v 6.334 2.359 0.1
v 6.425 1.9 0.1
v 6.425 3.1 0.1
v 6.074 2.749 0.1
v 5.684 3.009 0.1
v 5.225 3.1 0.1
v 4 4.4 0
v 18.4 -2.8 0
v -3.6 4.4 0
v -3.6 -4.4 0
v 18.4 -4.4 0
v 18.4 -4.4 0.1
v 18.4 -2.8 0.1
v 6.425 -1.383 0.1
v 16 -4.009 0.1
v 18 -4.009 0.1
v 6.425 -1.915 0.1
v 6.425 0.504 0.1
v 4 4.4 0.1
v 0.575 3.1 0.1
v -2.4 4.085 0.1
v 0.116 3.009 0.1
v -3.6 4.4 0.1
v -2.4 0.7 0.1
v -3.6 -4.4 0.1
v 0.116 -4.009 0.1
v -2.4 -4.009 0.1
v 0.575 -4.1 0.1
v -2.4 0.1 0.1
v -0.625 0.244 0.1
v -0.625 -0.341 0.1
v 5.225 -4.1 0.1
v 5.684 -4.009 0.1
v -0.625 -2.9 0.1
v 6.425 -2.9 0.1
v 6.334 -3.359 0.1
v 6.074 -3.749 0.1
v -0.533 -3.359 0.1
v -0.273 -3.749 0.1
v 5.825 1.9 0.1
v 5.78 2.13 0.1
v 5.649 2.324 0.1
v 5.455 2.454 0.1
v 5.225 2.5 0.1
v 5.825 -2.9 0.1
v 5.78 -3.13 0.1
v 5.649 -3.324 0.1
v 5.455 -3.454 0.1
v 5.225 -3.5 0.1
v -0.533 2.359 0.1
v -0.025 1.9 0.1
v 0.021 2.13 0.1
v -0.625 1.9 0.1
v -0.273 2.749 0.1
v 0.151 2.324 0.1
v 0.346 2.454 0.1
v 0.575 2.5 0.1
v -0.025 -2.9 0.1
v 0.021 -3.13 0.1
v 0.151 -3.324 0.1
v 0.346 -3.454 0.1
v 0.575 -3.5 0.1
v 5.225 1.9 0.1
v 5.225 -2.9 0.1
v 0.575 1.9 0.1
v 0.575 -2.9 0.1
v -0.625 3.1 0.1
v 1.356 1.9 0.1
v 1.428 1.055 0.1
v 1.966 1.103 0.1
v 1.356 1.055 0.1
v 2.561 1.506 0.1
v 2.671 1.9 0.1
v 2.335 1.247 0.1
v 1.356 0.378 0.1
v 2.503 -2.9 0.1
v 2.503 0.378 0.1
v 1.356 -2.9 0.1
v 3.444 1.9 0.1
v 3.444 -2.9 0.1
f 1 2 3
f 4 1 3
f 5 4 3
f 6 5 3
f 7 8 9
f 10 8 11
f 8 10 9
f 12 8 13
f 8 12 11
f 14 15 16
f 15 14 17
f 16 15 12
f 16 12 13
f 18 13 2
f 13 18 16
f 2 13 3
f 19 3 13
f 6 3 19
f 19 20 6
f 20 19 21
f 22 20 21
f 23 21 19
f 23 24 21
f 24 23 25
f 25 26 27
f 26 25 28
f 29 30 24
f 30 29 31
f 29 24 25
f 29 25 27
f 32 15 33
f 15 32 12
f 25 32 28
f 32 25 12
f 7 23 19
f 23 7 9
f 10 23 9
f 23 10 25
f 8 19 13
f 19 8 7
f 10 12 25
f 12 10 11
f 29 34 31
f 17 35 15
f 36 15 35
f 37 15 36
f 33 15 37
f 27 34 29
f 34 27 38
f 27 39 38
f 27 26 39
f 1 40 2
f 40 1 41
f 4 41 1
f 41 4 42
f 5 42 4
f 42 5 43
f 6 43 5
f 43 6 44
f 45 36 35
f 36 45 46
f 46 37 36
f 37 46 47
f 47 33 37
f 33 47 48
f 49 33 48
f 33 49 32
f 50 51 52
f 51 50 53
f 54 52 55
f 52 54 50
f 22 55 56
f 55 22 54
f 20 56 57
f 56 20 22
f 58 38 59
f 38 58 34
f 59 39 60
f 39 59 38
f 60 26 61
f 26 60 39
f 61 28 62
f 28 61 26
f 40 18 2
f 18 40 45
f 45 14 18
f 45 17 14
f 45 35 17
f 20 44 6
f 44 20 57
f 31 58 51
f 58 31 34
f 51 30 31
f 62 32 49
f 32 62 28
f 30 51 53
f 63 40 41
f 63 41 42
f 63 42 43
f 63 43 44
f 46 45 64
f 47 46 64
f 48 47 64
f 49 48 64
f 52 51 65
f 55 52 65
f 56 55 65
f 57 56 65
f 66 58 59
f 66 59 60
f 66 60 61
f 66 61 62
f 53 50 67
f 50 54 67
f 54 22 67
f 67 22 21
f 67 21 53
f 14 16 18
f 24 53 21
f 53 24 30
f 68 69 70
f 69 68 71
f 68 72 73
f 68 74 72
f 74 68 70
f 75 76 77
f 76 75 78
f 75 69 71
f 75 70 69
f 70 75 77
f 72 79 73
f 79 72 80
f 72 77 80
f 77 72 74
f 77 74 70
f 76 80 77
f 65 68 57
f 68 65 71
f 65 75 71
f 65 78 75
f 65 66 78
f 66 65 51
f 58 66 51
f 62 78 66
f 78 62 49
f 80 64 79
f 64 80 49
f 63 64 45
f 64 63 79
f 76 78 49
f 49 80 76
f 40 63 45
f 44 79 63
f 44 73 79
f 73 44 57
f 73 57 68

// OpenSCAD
// file: ../p/1-4ndis.scad
use <../lib.scad>
function ldraw_lib__1_4ndis() = [
// 0 Disc Negative 0.25
// 0 Name: 1-4ndis.dat
// 0 Author: James Jessiman
// 0 !LDRAW_ORG Primitive UPDATE 2012-01
// 0 !LICENSE Licensed under CC BY 2.0 and CC BY 4.0 : see CAreadme.txt
// 
// 0 BFC CERTIFY CCW
  [0,"BFC","CERTIFY"],
  [0,"BFC","CCW"],
// 
// 0 !HISTORY 2002-03-23 [sbliss] Added BFC Statement
// 0 !HISTORY 2002-04-25 [PTadmin] Official Update 2002-02
// 0 !HISTORY 2007-06-22 [PTadmin] Header formatted for Contributor Agreement
// 0 !HISTORY 2008-07-01 [PTadmin] Official Update 2008-01
// 0 !HISTORY 2012-02-16 [Philo] Changed to CCW
// 0 !HISTORY 2012-03-30 [PTadmin] Official Update 2012-01
// 
// 
// 3 16 0.9239 0 0.3827 1 0 0 1 0 1
  [3,16,0.9239,0,0.3827,1,0,0,1,0,1],
// 3 16 0.7071 0 0.7071 0.9239 0 0.3827 1 0 1
  [3,16,0.7071,0,0.7071,0.9239,0,0.3827,1,0,1],
// 3 16 0.3827 0 0.9239 0.7071 0 0.7071 1 0 1
  [3,16,0.3827,0,0.9239,0.7071,0,0.7071,1,0,1],
// 3 16 0 0 1 0.3827 0 0.9239 1 0 1
  [3,16,0,0,1,0.3827,0,0.9239,1,0,1],
];
makepoly(ldraw_lib__1_4ndis(), line=0.2);
// file: ../p/3-16ndis.scad
use <../lib.scad>
function ldraw_lib__3_16ndis() = [
// 0 Disc Negative 0.1875
// 0 Name: 3-16ndis.dat
// 0 Author: Guy Vivan [guyvivan]
// 0 !LDRAW_ORG Primitive UPDATE 2009-01
// 0 !LICENSE Licensed under CC BY 2.0 and CC BY 4.0 : see CAreadme.txt
// 
// 0 BFC CERTIFY CCW
  [0,"BFC","CERTIFY"],
  [0,"BFC","CCW"],
// 
// 0 !HISTORY 2009-05-02 [PTadmin] Official Update 2009-01
// 
// 
// 3 16 1 0 1 0.9239 0 0.3827 1 0 0
  [3,16,1,0,1,0.9239,0,0.3827,1,0,0],
// 3 16 1 0 1 0.7071 0 0.7071 0.9239 0 0.3827
  [3,16,1,0,1,0.7071,0,0.7071,0.9239,0,0.3827],
// 3 16 1 0 1 0.3827 0 0.9239 0.7071 0 0.7071
  [3,16,1,0,1,0.3827,0,0.9239,0.7071,0,0.7071],
// 
// 0 end of file
// 
];
makepoly(ldraw_lib__3_16ndis(), line=0.2);
// file: ../p/1-4ring1.scad
use <../lib.scad>
function ldraw_lib__1_4ring1() = [
// 0 Ring  1 x 0.25
// 0 Name: 1-4ring1.dat
// 0 Author: Chris Dee [cwdee]
// 0 !LDRAW_ORG Primitive UPDATE 2012-01
// 0 !LICENSE Licensed under CC BY 2.0 and CC BY 4.0 : see CAreadme.txt
// 
// 0 BFC CERTIFY CCW
  [0,"BFC","CERTIFY"],
  [0,"BFC","CCW"],
// 
// 0 !HISTORY 2000-05-07 [PTadmin] Official Update 2000-01
// 0 !HISTORY 2002-11-22 [hafhead] Added BFC statement
// 0 !HISTORY 2002-11-30 [PTadmin] Official Update 2002-05
// 0 !HISTORY 2007-06-22 [PTadmin] Header formatted for Contributor Agreement
// 0 !HISTORY 2008-07-01 [PTadmin] Official Update 2008-01
// 0 !HISTORY 2012-02-16 [Philo] Changed to CCW
// 0 !HISTORY 2012-03-30 [PTadmin] Official Update 2012-01
// 
// 
// 4 16 2 0 0 1.8478 0 0.7654 0.9239 0 0.3827 1 0 0
  [4,16,2,0,0,1.8478,0,0.7654,0.9239,0,0.3827,1,0,0],
// 4 16 1.8478 0 0.7654 1.4142 0 1.4142 0.7071 0 0.7071 0.9239 0 0.3827
  [4,16,1.8478,0,0.7654,1.4142,0,1.4142,0.7071,0,0.7071,0.9239,0,0.3827],
// 4 16 1.4142 0 1.4142 0.7654 0 1.8478 0.3827 0 0.9239 0.7071 0 0.7071
  [4,16,1.4142,0,1.4142,0.7654,0,1.8478,0.3827,0,0.9239,0.7071,0,0.7071],
// 4 16 0.7654 0 1.8478 0 0 2 0 0 1 0.3827 0 0.9239
  [4,16,0.7654,0,1.8478,0,0,2,0,0,1,0.3827,0,0.9239],
];
makepoly(ldraw_lib__1_4ring1(), line=0.2);
// file: ../p/1-4disc.scad
use <../lib.scad>
function ldraw_lib__1_4disc() = [
// 0 Disc 0.25
// 0 Name: 1-4disc.dat
// 0 Author: James Jessiman
// 0 !LDRAW_ORG Primitive UPDATE 2002-02
// 0 !LICENSE Licensed under CC BY 2.0 and CC BY 4.0 : see CAreadme.txt
// 
// 0 BFC CERTIFY CCW
  [0,"BFC","CERTIFY"],
  [0,"BFC","CCW"],
// 
// 0 !HISTORY 2002-03-23 [sbliss] Added BFC statement.
// 0 !HISTORY 2002-04-25 [PTadmin] Official Update 2002-02
// 0 !HISTORY 2007-06-22 [PTadmin] Header formatted for Contributor Agreement
// 0 !HISTORY 2008-07-01 [PTadmin] Official Update 2008-01
// 
// 
// 3 16 0 0 0 1 0 0 0.9239 0 0.3827
  [3,16,0,0,0,1,0,0,0.9239,0,0.3827],
// 3 16 0 0 0 0.9239 0 0.3827 0.7071 0 0.7071
  [3,16,0,0,0,0.9239,0,0.3827,0.7071,0,0.7071],
// 3 16 0 0 0 0.7071 0 0.7071 0.3827 0 0.9239
  [3,16,0,0,0,0.7071,0,0.7071,0.3827,0,0.9239],
// 3 16 0 0 0 0.3827 0 0.9239 0 0 1
  [3,16,0,0,0,0.3827,0,0.9239,0,0,1],
// 0
];
makepoly(ldraw_lib__1_4disc(), line=0.2);
// file: ../p/type-swiss721bt-bold-n1.scad
use <../lib.scad>
function ldraw_lib__type_swiss721bt_bold_n1() = [
// 0 Type Swiss721BT Number "1" Bold
// 0 Name: type-swiss721bt-bold-n1.dat
// 0 Author: Ulrich Röder [UR]
// 0 !LDRAW_ORG Primitive UPDATE 2019-01
// 0 !LICENSE Licensed under CC BY 2.0 and CC BY 4.0 : see CAreadme.txt
// 
// 0 BFC CERTIFY CCW
  [0,"BFC","CERTIFY"],
  [0,"BFC","CCW"],
// 
// 0 !HISTORY 2019-06-28 [PTadmin] Official Update 2019-01
// 
// 
// 0 // Main
// 4 16 -.2175 0 .324 -.2025 0 .324 -.0905 0 .334 -.2175 0 .5
  [4,16,-.2175,0,.324,-.2025,0,.324,-.0905,0,.334,-.2175,0,.5],
// 3 16 -.2175 0 .5 .0335 0 .418 .0565 0 .5
  [3,16,-.2175,0,.5,.0335,0,.418,.0565,0,.5],
// 4 16 .0335 0 .418 -.2175 0 .5 -.0905 0 .334 -.0135 0 .364
  [4,16,.0335,0,.418,-.2175,0,.5,-.0905,0,.334,-.0135,0,.364],
// 4 16 .0215 0 .183 -.2175 0 .183 -.2175 0 -.5 .0215 0 -.5
  [4,16,.0215,0,.183,-.2175,0,.183,-.2175,0,-.5,.0215,0,-.5],
// 
// 0 // Black
// 3 0 -.2175 0 .183 -.2025 0 .324 -.2175 0 .324
  [3,0,-.2175,0,.183,-.2025,0,.324,-.2175,0,.324],
// 4 0 .0215 0 .183 -.0905 0 .334 -.2025 0 .324 -.2175 0 .183
  [4,0,.0215,0,.183,-.0905,0,.334,-.2025,0,.324,-.2175,0,.183],
// 4 0 .0335 0 .418 .2175 0 -.5 .2175 0 .5 .0565 0 .5
  [4,0,.0335,0,.418,.2175,0,-.5,.2175,0,.5,.0565,0,.5],
// 4 0 .0215 0 .183 .2175 0 -.5 .0335 0 .418 -.0135 0 .364
  [4,0,.0215,0,.183,.2175,0,-.5,.0335,0,.418,-.0135,0,.364],
// 3 0 .0215 0 .183 -.0135 0 .364 -.0905 0 .334
  [3,0,.0215,0,.183,-.0135,0,.364,-.0905,0,.334],
// 3 0 .0215 0 -.5 .2175 0 -.5 .0215 0 .183
  [3,0,.0215,0,-.5,.2175,0,-.5,.0215,0,.183],
];
makepoly(ldraw_lib__type_swiss721bt_bold_n1(), line=0.2);
// file: s/821435as03.scad
use <../../lib.scad>
use <../../p/1-4ndis.scad>
function ldraw_lib__s__821435as03() = [
// 0 ~Sticker Sloped Body for Racing Number
// 0 Name: s\821435as03.dat
// 0 Author: Ulrich Röder [UR]
// 0 !LDRAW_ORG Subpart UPDATE 2019-01
// 0 !LICENSE Licensed under CC BY 2.0 and CC BY 4.0 : see CAreadme.txt
// 
// 0 BFC CERTIFY CCW
  [0,"BFC","CERTIFY"],
  [0,"BFC","CCW"],
// 
// 0 !HISTORY 2019-06-28 [PTadmin] Official Update 2019-01
// 
// 
// 0 // Main
// 1 16 13.063 -.25 4.75 3 0 0 0 1 0 0 0 3 1-4ndis.dat
  [1,16,13.063,-.25,4.75,3,0,0,0,1,0,0,0,3, ldraw_lib__1_4ndis()],
// 3 16 10 0 11 46 0 -7 -9 0 11
  [3,16,10,0,11,46,0,-7,-9,0,11],
// 4 16 -9 0 -11 -9 0 11 46 0 -7 46 0 -11
  [4,16,-9,0,-11,-9,0,11,46,0,-7,46,0,-11],
// 4 16 46 -.25 -11 46 0 -11 46 0 -7 46 -.25 -7
  [4,16,46,-.25,-11,46,0,-11,46,0,-7,46,-.25,-7],
// 4 16 16.063 -.25 -4.788 40 -.25 -10.022 45 -.25 -10.022 16.063 -.25 -3.458
  [4,16,16.063,-.25,-4.788,40,-.25,-10.022,45,-.25,-10.022,16.063,-.25,-3.458],
// 3 16 45 -.25 -10.022 40 -.25 -10.022 46 -.25 -11
  [3,16,45,-.25,-10.022,40,-.25,-10.022,46,-.25,-11],
// 3 16 45 -.25 -10.022 46 -.25 -11 46 -.25 -7
  [3,16,45,-.25,-10.022,46,-.25,-11,46,-.25,-7],
// 4 16 16.063 -.25 4.75 16.063 -.25 1.261 45 -.25 -10.022 46 -.25 -7
  [4,16,16.063,-.25,4.75,16.063,-.25,1.261,45,-.25,-10.022,46,-.25,-7],
// 3 16 16.063 -.25 4.75 46 -.25 -7 16.063 -.25 7.75
  [3,16,16.063,-.25,4.75,46,-.25,-7,16.063,-.25,7.75],
// 3 16 10 -.25 11 16.063 -.25 7.75 46 -.25 -7
  [3,16,10,-.25,11,16.063,-.25,7.75,46,-.25,-7],
// 3 16 13.063 -.25 7.75 16.063 -.25 7.75 10 -.25 11
  [3,16,13.063,-.25,7.75,16.063,-.25,7.75,10,-.25,11],
// 4 16 -6 -.25 10.213 1.438 -.25 7.75 13.063 -.25 7.75 10 -.25 11
  [4,16,-6,-.25,10.213,1.438,-.25,7.75,13.063,-.25,7.75,10,-.25,11],
// 3 16 .2899 -.25 7.5217 1.438 -.25 7.75 -6 -.25 10.213
  [3,16,.2899,-.25,7.5217,1.438,-.25,7.75,-6,-.25,10.213],
// 3 16 -9 -.25 11 -6 -.25 10.213 10 -.25 11
  [3,16,-9,-.25,11,-6,-.25,10.213,10,-.25,11],
// 4 16 -9 -.25 -11 -6 -.25 1.75 -6 -.25 10.213 -9 -.25 11
  [4,16,-9,-.25,-11,-6,-.25,1.75,-6,-.25,10.213,-9,-.25,11],
// 4 16 1.438 -.25 -10.25 .2899 -.25 -10.0217 -6 -.25 -10.022 -9 -.25 -11
  [4,16,1.438,-.25,-10.25,.2899,-.25,-10.0217,-6,-.25,-10.022,-9,-.25,-11],
// 4 16 -1.563 -.25 .61 -6 -.25 1.75 -6 -.25 .25 -1.563 -.25 -.853
  [4,16,-1.563,-.25,.61,-6,-.25,1.75,-6,-.25,.25,-1.563,-.25,-.853],
// 3 16 -6 -.25 .25 -6 -.25 1.75 -9 -.25 -11
  [3,16,-6,-.25,.25,-6,-.25,1.75,-9,-.25,-11],
// 3 16 -6 -.25 .25 -9 -.25 -11 -6 -.25 -10.022
  [3,16,-6,-.25,.25,-9,-.25,-11,-6,-.25,-10.022],
// 4 16 40 -.25 -10.022 14.2111 -.25 -10.0217 13.063 -.25 -10.25 46 -.25 -11
  [4,16,40,-.25,-10.022,14.2111,-.25,-10.0217,13.063,-.25,-10.25,46,-.25,-11],
// 4 16 1.438 -.25 -10.25 -9 -.25 -11 46 -.25 -11 13.063 -.25 -10.25
  [4,16,1.438,-.25,-10.25,-9,-.25,-11,46,-.25,-11,13.063,-.25,-10.25],
// 4 16 -9 -.25 11 10 -.25 11 10 0 11 -9 0 11
  [4,16,-9,-.25,11,10,-.25,11,10,0,11,-9,0,11],
// 4 16 -9 0 11 -9 0 -11 -9 -.25 -11 -9 -.25 11
  [4,16,-9,0,11,-9,0,-11,-9,-.25,-11,-9,-.25,11],
// 4 16 10 -.25 11 46 -.25 -7 46 0 -7 10 0 11
  [4,16,10,-.25,11,46,-.25,-7,46,0,-7,10,0,11],
// 4 16 46 0 -11 46 -.25 -11 -9 -.25 -11 -9 0 -11
  [4,16,46,0,-11,46,-.25,-11,-9,-.25,-11,-9,0,-11],
];
makepoly(ldraw_lib__s__821435as03(), line=0.2);
// file: s/821435as02.scad
use <../../lib.scad>
use <../../p/3-16ndis.scad>
function ldraw_lib__s__821435as02() = [
// 0 ~Sticker Upper Triangle with Cutout for Racing Number
// 0 Name: s\821435as02.dat
// 0 Author: Ulrich Röder [UR]
// 0 !LDRAW_ORG Subpart UPDATE 2019-01
// 0 !LICENSE Licensed under CC BY 2.0 and CC BY 4.0 : see CAreadme.txt
// 
// 0 BFC CERTIFY CCW
  [0,"BFC","CERTIFY"],
  [0,"BFC","CCW"],
// 
// 0 !HISTORY 2019-06-28 [PTadmin] Official Update 2019-01
// 
// 
// 0 // Main
// 1 16 1.438 -.25 4.75 -3 0 0 0 1 0 0 0 3 3-16ndis.dat
  [1,16,1.438,-.25,4.75,-3,0,0,0,1,0,0,0,3, ldraw_lib__3_16ndis()],
// 3 16 -1.562 -.25 7.75 .2899 -.25 7.5217 -6 -.25 10.213
  [3,16,-1.562,-.25,7.75,.2899,-.25,7.5217,-6,-.25,10.213],
// 3 16 -1.562 -.25 7.75 -6 -.25 10.213 -1.562 -.25 4.75
  [3,16,-1.562,-.25,7.75,-6,-.25,10.213,-1.562,-.25,4.75],
// 3 16 16.063 -.25 -3.458 45 -.25 -10.022 16.063 -.25 1.261
  [3,16,16.063,-.25,-3.458,45,-.25,-10.022,16.063,-.25,1.261],
// 4 16 -6 -.25 1.75 -1.563 -.25 .61 -1.562 -.25 4.75 -6 -.25 10.213
  [4,16,-6,-.25,1.75,-1.563,-.25,.61,-1.562,-.25,4.75,-6,-.25,10.213],
];
makepoly(ldraw_lib__s__821435as02(), line=0.2);
// file: s/821435as01.scad
use <../../lib.scad>
use <../../p/1-4disc.scad>
use <../../p/1-4ring1.scad>
function ldraw_lib__s__821435as01() = [
// 0 ~Sticker Lower Triangle and Racing Number Frame
// 0 Name: s\821435as01.dat
// 0 Author: Ulrich Röder [UR]
// 0 !LDRAW_ORG Subpart UPDATE 2019-01
// 0 !LICENSE Licensed under CC BY 2.0 and CC BY 4.0 : see CAreadme.txt
// 
// 0 BFC CERTIFY CCW
  [0,"BFC","CERTIFY"],
  [0,"BFC","CCW"],
// 
// 0 !HISTORY 2019-06-28 [PTadmin] Official Update 2019-01
// 
// 
// 0 // Main
// 
// 3 16 -6 -0.25 0.25 -1.562 -0.25 -7.25 -1.563 -0.25 -0.853
  [3,16,-6,-0.25,0.25,-1.562,-0.25,-7.25,-1.563,-0.25,-0.853],
// 3 16 16.063 -0.25 -4.788 16.063 -0.25 -7.25 40 -0.25 -10.022
  [3,16,16.063,-0.25,-4.788,16.063,-0.25,-7.25,40,-0.25,-10.022],
// 3 16 15.8347 -0.25 -8.3981 40 -0.25 -10.022 16.063 -0.25 -7.25
  [3,16,15.8347,-0.25,-8.3981,40,-0.25,-10.022,16.063,-0.25,-7.25],
// 3 16 15.1843 -0.25 -9.3713 40 -0.25 -10.022 15.8347 -0.25 -8.3981
  [3,16,15.1843,-0.25,-9.3713,40,-0.25,-10.022,15.8347,-0.25,-8.3981],
// 3 16 14.2111 -0.25 -10.0217 40 -0.25 -10.022 15.1843 -0.25 -9.3713
  [3,16,14.2111,-0.25,-10.0217,40,-0.25,-10.022,15.1843,-0.25,-9.3713],
// 4 16 -6 -0.25 0.25 -6 -0.25 -10.022 -1.3337 -0.25 -8.3981 -1.562 -0.25 -7.25
  [4,16,-6,-0.25,0.25,-6,-0.25,-10.022,-1.3337,-0.25,-8.3981,-1.562,-0.25,-7.25],
// 3 16 -6 -0.25 -10.022 -0.6833 -0.25 -9.3713 -1.3337 -0.25 -8.3981
  [3,16,-6,-0.25,-10.022,-0.6833,-0.25,-9.3713,-1.3337,-0.25,-8.3981],
// 3 16 -6 -0.25 -10.022 0.2899 -0.25 -10.0217 -0.6833 -0.25 -9.3713
  [3,16,-6,-0.25,-10.022,0.2899,-0.25,-10.0217,-0.6833,-0.25,-9.3713],
// 
// 0 // Black
// 1 0 13.063 -.25 4.75 1.5 0 0 0 1 0 0 0 1.5 1-4ring1.dat
  [1,0,13.063,-.25,4.75,1.5,0,0,0,1,0,0,0,1.5, ldraw_lib__1_4ring1()],
// 1 0 13.063 -.25 -7.25 1.5 0 0 0 1 0 0 0 -1.5 1-4ring1.dat
  [1,0,13.063,-.25,-7.25,1.5,0,0,0,1,0,0,0,-1.5, ldraw_lib__1_4ring1()],
// 1 0 1.438 -.25 4.75 -1.5 0 0 0 1 0 0 0 1.5 1-4ring1.dat
  [1,0,1.438,-.25,4.75,-1.5,0,0,0,1,0,0,0,1.5, ldraw_lib__1_4ring1()],
// 1 0 1.438 -.25 -7.25 -1.5 0 0 0 1 0 0 0 -1.5 1-4ring1.dat
  [1,0,1.438,-.25,-7.25,-1.5,0,0,0,1,0,0,0,-1.5, ldraw_lib__1_4ring1()],
// 4 0 14.563 -0.25 4.75 14.563 -0.25 -7.25 16.063 -0.25 1.261 16.063 -0.25 4.75
  [4,0,14.563,-0.25,4.75,14.563,-0.25,-7.25,16.063,-0.25,1.261,16.063,-0.25,4.75],
// 3 0 14.563 -0.25 -7.25 16.063 -0.25 -3.458 16.063 -0.25 1.261
  [3,0,14.563,-0.25,-7.25,16.063,-0.25,-3.458,16.063,-0.25,1.261],
// 3 0 14.563 -0.25 -7.25 16.063 -0.25 -4.788 16.063 -0.25 -3.458
  [3,0,14.563,-0.25,-7.25,16.063,-0.25,-4.788,16.063,-0.25,-3.458],
// 3 0 14.563 -0.25 -7.25 16.063 -0.25 -7.25 16.063 -0.25 -4.788
  [3,0,14.563,-0.25,-7.25,16.063,-0.25,-7.25,16.063,-0.25,-4.788],
// 4 0 13.063 -0.25 6.25 13.063 -0.25 7.75 1.438 -0.25 7.75 1.438 -0.25 6.25
  [4,0,13.063,-0.25,6.25,13.063,-0.25,7.75,1.438,-0.25,7.75,1.438,-0.25,6.25],
// 4 0 -0.062 -0.25 4.75 -1.563 -0.25 -0.853 -1.562 -0.25 -7.25 -0.062 -0.25 -7.25
  [4,0,-0.062,-0.25,4.75,-1.563,-0.25,-0.853,-1.562,-0.25,-7.25,-0.062,-0.25,-7.25],
// 3 0 -0.062 -0.25 4.75 -1.563 -0.25 0.61 -1.563 -0.25 -0.853
  [3,0,-0.062,-0.25,4.75,-1.563,-0.25,0.61,-1.563,-0.25,-0.853],
// 4 0 1.438 -0.25 -10.25 13.063 -0.25 -10.25 13.063 -0.25 -8.75 1.438 -0.25 -8.75
  [4,0,1.438,-0.25,-10.25,13.063,-0.25,-10.25,13.063,-0.25,-8.75,1.438,-0.25,-8.75],
// 3 0 -1.563 -0.25 0.61 -0.062 -0.25 4.75 -1.562 -0.25 4.75
  [3,0,-1.563,-0.25,0.61,-0.062,-0.25,4.75,-1.562,-0.25,4.75],
// 
// 0 // White
// 1 15 13.063 -.25 4.75 1.5 0 0 0 1 0 0 0 1.5 1-4disc.dat
  [1,15,13.063,-.25,4.75,1.5,0,0,0,1,0,0,0,1.5, ldraw_lib__1_4disc()],
// 1 15 13.063 -.25 -7.25 1.5 0 0 0 1 0 0 0 -1.5 1-4disc.dat
  [1,15,13.063,-.25,-7.25,1.5,0,0,0,1,0,0,0,-1.5, ldraw_lib__1_4disc()],
// 1 15 1.438 -.25 4.75 -1.5 0 0 0 1 0 0 0 1.5 1-4disc.dat
  [1,15,1.438,-.25,4.75,-1.5,0,0,0,1,0,0,0,1.5, ldraw_lib__1_4disc()],
// 1 15 1.438 -.25 -7.25 -1.5 0 0 0 1 0 0 0 -1.5 1-4disc.dat
  [1,15,1.438,-.25,-7.25,-1.5,0,0,0,1,0,0,0,-1.5, ldraw_lib__1_4disc()],
];
makepoly(ldraw_lib__s__821435as01(), line=0.2);
// main file
use <../lib.scad>
use <s/821435as01.scad>
use <s/821435as02.scad>
use <s/821435as03.scad>
use <../p/type-swiss721bt-bold-n1.scad>
function ldraw_lib__821435a() = [
// 0 Sticker with Red/Green Triangles and Racing Number "1", Right
// 0 Name: 821435a.dat
// 0 Author: Ulrich Röder [UR]
// 0 !LDRAW_ORG Part UPDATE 2019-01
// 0 !LICENSE Licensed under CC BY 2.0 and CC BY 4.0 : see CAreadme.txt
// 
// 0 BFC CERTIFY CCW
  [0,"BFC","CERTIFY"],
  [0,"BFC","CCW"],
// 
// 0 !KEYWORDS cup, Racers, Set 6539
// 
// 0 !HISTORY 2019-06-28 [PTadmin] Official Update 2019-01
// 
// 
// 0 // Main
// 
// 1 16 0 0 0 1 0 0 0 1 0 0 0 1 s\821435as03.dat
  [1,16,0,0,0,1,0,0,0,1,0,0,0,1, ldraw_lib__s__821435as03()],
// 
// 0 // Green
// 1 2 0 0 0 1 0 0 0 1 0 0 0 1 s\821435as01.dat
  [1,2,0,0,0,1,0,0,0,1,0,0,0,1, ldraw_lib__s__821435as01()],
// 
// 0 // Red
// 1 4 0 0 0 1 0 0 0 1 0 0 0 1 s\821435as02.dat
  [1,4,0,0,0,1,0,0,0,1,0,0,0,1, ldraw_lib__s__821435as02()],
// 
// 0 // White
// 1 15 6 -.25 -1.25 12 0 0 0 1 0 0 0 12 type-swiss721bt-bold-n1.dat
  [1,15,6,-.25,-1.25,12,0,0,0,1,0,0,0,12, ldraw_lib__type_swiss721bt_bold_n1()],
// 4 15 3.39 -0.25 2.638 3.39 -0.25 4.75 1.438 -0.25 6.25 1.438 -0.25 4.75
  [4,15,3.39,-0.25,2.638,3.39,-0.25,4.75,1.438,-0.25,6.25,1.438,-0.25,4.75],
// 3 15 1.438 -0.25 4.75 3.39 -0.25 0.946 3.39 -0.25 2.638
  [3,15,1.438,-0.25,4.75,3.39,-0.25,0.946,3.39,-0.25,2.638],
// 3 15 1.438 -0.25 4.75 3.39 -0.25 -7.25 3.39 -0.25 0.946
  [3,15,1.438,-0.25,4.75,3.39,-0.25,-7.25,3.39,-0.25,0.946],
// 4 15 1.438 -0.25 4.75 -0.062 -0.25 4.75 1.438 -0.25 -7.25 3.39 -0.25 -7.25
  [4,15,1.438,-0.25,4.75,-0.062,-0.25,4.75,1.438,-0.25,-7.25,3.39,-0.25,-7.25],
// 3 15 -0.062 -0.25 -7.25 1.438 -0.25 -7.25 -0.062 -0.25 4.75
  [3,15,-0.062,-0.25,-7.25,1.438,-0.25,-7.25,-0.062,-0.25,4.75],
// 4 15 13.063 -0.25 -8.75 3.39 -0.25 -7.25 1.438 -0.25 -7.25 1.438 -0.25 -8.75
  [4,15,13.063,-0.25,-8.75,3.39,-0.25,-7.25,1.438,-0.25,-7.25,1.438,-0.25,-8.75],
// 4 15 8.61 -0.25 4.75 8.61 -0.25 -7.25 13.063 -0.25 -8.75 13.063 -0.25 -7.25
  [4,15,8.61,-0.25,4.75,8.61,-0.25,-7.25,13.063,-0.25,-8.75,13.063,-0.25,-7.25],
// 4 15 13.063 -0.25 4.75 8.61 -0.25 4.75 13.063 -0.25 -7.25 14.563 -0.25 -7.25
  [4,15,13.063,-0.25,4.75,8.61,-0.25,4.75,13.063,-0.25,-7.25,14.563,-0.25,-7.25],
// 3 15 6.258 -0.25 -7.25 3.39 -0.25 -7.25 13.063 -0.25 -8.75
  [3,15,6.258,-0.25,-7.25,3.39,-0.25,-7.25,13.063,-0.25,-8.75],
// 3 15 13.063 -0.25 -8.75 8.61 -0.25 -7.25 6.258 -0.25 -7.25
  [3,15,13.063,-0.25,-8.75,8.61,-0.25,-7.25,6.258,-0.25,-7.25],
// 3 15 14.563 -0.25 4.75 13.063 -0.25 4.75 14.563 -0.25 -7.25
  [3,15,14.563,-0.25,4.75,13.063,-0.25,4.75,14.563,-0.25,-7.25],
// 3 15 13.063 -0.25 6.25 8.61 -0.25 4.75 13.063 -0.25 4.75
  [3,15,13.063,-0.25,6.25,8.61,-0.25,4.75,13.063,-0.25,4.75],
// 4 15 1.438 -0.25 6.25 6.678 -0.25 4.75 8.61 -0.25 4.75 13.063 -0.25 6.25
  [4,15,1.438,-0.25,6.25,6.678,-0.25,4.75,8.61,-0.25,4.75,13.063,-0.25,6.25],
// 3 15 6.678 -0.25 4.75 1.438 -0.25 6.25 3.39 -0.25 4.75
  [3,15,6.678,-0.25,4.75,1.438,-0.25,6.25,3.39,-0.25,4.75],
];
makepoly(ldraw_lib__821435a(), line=0.2);
